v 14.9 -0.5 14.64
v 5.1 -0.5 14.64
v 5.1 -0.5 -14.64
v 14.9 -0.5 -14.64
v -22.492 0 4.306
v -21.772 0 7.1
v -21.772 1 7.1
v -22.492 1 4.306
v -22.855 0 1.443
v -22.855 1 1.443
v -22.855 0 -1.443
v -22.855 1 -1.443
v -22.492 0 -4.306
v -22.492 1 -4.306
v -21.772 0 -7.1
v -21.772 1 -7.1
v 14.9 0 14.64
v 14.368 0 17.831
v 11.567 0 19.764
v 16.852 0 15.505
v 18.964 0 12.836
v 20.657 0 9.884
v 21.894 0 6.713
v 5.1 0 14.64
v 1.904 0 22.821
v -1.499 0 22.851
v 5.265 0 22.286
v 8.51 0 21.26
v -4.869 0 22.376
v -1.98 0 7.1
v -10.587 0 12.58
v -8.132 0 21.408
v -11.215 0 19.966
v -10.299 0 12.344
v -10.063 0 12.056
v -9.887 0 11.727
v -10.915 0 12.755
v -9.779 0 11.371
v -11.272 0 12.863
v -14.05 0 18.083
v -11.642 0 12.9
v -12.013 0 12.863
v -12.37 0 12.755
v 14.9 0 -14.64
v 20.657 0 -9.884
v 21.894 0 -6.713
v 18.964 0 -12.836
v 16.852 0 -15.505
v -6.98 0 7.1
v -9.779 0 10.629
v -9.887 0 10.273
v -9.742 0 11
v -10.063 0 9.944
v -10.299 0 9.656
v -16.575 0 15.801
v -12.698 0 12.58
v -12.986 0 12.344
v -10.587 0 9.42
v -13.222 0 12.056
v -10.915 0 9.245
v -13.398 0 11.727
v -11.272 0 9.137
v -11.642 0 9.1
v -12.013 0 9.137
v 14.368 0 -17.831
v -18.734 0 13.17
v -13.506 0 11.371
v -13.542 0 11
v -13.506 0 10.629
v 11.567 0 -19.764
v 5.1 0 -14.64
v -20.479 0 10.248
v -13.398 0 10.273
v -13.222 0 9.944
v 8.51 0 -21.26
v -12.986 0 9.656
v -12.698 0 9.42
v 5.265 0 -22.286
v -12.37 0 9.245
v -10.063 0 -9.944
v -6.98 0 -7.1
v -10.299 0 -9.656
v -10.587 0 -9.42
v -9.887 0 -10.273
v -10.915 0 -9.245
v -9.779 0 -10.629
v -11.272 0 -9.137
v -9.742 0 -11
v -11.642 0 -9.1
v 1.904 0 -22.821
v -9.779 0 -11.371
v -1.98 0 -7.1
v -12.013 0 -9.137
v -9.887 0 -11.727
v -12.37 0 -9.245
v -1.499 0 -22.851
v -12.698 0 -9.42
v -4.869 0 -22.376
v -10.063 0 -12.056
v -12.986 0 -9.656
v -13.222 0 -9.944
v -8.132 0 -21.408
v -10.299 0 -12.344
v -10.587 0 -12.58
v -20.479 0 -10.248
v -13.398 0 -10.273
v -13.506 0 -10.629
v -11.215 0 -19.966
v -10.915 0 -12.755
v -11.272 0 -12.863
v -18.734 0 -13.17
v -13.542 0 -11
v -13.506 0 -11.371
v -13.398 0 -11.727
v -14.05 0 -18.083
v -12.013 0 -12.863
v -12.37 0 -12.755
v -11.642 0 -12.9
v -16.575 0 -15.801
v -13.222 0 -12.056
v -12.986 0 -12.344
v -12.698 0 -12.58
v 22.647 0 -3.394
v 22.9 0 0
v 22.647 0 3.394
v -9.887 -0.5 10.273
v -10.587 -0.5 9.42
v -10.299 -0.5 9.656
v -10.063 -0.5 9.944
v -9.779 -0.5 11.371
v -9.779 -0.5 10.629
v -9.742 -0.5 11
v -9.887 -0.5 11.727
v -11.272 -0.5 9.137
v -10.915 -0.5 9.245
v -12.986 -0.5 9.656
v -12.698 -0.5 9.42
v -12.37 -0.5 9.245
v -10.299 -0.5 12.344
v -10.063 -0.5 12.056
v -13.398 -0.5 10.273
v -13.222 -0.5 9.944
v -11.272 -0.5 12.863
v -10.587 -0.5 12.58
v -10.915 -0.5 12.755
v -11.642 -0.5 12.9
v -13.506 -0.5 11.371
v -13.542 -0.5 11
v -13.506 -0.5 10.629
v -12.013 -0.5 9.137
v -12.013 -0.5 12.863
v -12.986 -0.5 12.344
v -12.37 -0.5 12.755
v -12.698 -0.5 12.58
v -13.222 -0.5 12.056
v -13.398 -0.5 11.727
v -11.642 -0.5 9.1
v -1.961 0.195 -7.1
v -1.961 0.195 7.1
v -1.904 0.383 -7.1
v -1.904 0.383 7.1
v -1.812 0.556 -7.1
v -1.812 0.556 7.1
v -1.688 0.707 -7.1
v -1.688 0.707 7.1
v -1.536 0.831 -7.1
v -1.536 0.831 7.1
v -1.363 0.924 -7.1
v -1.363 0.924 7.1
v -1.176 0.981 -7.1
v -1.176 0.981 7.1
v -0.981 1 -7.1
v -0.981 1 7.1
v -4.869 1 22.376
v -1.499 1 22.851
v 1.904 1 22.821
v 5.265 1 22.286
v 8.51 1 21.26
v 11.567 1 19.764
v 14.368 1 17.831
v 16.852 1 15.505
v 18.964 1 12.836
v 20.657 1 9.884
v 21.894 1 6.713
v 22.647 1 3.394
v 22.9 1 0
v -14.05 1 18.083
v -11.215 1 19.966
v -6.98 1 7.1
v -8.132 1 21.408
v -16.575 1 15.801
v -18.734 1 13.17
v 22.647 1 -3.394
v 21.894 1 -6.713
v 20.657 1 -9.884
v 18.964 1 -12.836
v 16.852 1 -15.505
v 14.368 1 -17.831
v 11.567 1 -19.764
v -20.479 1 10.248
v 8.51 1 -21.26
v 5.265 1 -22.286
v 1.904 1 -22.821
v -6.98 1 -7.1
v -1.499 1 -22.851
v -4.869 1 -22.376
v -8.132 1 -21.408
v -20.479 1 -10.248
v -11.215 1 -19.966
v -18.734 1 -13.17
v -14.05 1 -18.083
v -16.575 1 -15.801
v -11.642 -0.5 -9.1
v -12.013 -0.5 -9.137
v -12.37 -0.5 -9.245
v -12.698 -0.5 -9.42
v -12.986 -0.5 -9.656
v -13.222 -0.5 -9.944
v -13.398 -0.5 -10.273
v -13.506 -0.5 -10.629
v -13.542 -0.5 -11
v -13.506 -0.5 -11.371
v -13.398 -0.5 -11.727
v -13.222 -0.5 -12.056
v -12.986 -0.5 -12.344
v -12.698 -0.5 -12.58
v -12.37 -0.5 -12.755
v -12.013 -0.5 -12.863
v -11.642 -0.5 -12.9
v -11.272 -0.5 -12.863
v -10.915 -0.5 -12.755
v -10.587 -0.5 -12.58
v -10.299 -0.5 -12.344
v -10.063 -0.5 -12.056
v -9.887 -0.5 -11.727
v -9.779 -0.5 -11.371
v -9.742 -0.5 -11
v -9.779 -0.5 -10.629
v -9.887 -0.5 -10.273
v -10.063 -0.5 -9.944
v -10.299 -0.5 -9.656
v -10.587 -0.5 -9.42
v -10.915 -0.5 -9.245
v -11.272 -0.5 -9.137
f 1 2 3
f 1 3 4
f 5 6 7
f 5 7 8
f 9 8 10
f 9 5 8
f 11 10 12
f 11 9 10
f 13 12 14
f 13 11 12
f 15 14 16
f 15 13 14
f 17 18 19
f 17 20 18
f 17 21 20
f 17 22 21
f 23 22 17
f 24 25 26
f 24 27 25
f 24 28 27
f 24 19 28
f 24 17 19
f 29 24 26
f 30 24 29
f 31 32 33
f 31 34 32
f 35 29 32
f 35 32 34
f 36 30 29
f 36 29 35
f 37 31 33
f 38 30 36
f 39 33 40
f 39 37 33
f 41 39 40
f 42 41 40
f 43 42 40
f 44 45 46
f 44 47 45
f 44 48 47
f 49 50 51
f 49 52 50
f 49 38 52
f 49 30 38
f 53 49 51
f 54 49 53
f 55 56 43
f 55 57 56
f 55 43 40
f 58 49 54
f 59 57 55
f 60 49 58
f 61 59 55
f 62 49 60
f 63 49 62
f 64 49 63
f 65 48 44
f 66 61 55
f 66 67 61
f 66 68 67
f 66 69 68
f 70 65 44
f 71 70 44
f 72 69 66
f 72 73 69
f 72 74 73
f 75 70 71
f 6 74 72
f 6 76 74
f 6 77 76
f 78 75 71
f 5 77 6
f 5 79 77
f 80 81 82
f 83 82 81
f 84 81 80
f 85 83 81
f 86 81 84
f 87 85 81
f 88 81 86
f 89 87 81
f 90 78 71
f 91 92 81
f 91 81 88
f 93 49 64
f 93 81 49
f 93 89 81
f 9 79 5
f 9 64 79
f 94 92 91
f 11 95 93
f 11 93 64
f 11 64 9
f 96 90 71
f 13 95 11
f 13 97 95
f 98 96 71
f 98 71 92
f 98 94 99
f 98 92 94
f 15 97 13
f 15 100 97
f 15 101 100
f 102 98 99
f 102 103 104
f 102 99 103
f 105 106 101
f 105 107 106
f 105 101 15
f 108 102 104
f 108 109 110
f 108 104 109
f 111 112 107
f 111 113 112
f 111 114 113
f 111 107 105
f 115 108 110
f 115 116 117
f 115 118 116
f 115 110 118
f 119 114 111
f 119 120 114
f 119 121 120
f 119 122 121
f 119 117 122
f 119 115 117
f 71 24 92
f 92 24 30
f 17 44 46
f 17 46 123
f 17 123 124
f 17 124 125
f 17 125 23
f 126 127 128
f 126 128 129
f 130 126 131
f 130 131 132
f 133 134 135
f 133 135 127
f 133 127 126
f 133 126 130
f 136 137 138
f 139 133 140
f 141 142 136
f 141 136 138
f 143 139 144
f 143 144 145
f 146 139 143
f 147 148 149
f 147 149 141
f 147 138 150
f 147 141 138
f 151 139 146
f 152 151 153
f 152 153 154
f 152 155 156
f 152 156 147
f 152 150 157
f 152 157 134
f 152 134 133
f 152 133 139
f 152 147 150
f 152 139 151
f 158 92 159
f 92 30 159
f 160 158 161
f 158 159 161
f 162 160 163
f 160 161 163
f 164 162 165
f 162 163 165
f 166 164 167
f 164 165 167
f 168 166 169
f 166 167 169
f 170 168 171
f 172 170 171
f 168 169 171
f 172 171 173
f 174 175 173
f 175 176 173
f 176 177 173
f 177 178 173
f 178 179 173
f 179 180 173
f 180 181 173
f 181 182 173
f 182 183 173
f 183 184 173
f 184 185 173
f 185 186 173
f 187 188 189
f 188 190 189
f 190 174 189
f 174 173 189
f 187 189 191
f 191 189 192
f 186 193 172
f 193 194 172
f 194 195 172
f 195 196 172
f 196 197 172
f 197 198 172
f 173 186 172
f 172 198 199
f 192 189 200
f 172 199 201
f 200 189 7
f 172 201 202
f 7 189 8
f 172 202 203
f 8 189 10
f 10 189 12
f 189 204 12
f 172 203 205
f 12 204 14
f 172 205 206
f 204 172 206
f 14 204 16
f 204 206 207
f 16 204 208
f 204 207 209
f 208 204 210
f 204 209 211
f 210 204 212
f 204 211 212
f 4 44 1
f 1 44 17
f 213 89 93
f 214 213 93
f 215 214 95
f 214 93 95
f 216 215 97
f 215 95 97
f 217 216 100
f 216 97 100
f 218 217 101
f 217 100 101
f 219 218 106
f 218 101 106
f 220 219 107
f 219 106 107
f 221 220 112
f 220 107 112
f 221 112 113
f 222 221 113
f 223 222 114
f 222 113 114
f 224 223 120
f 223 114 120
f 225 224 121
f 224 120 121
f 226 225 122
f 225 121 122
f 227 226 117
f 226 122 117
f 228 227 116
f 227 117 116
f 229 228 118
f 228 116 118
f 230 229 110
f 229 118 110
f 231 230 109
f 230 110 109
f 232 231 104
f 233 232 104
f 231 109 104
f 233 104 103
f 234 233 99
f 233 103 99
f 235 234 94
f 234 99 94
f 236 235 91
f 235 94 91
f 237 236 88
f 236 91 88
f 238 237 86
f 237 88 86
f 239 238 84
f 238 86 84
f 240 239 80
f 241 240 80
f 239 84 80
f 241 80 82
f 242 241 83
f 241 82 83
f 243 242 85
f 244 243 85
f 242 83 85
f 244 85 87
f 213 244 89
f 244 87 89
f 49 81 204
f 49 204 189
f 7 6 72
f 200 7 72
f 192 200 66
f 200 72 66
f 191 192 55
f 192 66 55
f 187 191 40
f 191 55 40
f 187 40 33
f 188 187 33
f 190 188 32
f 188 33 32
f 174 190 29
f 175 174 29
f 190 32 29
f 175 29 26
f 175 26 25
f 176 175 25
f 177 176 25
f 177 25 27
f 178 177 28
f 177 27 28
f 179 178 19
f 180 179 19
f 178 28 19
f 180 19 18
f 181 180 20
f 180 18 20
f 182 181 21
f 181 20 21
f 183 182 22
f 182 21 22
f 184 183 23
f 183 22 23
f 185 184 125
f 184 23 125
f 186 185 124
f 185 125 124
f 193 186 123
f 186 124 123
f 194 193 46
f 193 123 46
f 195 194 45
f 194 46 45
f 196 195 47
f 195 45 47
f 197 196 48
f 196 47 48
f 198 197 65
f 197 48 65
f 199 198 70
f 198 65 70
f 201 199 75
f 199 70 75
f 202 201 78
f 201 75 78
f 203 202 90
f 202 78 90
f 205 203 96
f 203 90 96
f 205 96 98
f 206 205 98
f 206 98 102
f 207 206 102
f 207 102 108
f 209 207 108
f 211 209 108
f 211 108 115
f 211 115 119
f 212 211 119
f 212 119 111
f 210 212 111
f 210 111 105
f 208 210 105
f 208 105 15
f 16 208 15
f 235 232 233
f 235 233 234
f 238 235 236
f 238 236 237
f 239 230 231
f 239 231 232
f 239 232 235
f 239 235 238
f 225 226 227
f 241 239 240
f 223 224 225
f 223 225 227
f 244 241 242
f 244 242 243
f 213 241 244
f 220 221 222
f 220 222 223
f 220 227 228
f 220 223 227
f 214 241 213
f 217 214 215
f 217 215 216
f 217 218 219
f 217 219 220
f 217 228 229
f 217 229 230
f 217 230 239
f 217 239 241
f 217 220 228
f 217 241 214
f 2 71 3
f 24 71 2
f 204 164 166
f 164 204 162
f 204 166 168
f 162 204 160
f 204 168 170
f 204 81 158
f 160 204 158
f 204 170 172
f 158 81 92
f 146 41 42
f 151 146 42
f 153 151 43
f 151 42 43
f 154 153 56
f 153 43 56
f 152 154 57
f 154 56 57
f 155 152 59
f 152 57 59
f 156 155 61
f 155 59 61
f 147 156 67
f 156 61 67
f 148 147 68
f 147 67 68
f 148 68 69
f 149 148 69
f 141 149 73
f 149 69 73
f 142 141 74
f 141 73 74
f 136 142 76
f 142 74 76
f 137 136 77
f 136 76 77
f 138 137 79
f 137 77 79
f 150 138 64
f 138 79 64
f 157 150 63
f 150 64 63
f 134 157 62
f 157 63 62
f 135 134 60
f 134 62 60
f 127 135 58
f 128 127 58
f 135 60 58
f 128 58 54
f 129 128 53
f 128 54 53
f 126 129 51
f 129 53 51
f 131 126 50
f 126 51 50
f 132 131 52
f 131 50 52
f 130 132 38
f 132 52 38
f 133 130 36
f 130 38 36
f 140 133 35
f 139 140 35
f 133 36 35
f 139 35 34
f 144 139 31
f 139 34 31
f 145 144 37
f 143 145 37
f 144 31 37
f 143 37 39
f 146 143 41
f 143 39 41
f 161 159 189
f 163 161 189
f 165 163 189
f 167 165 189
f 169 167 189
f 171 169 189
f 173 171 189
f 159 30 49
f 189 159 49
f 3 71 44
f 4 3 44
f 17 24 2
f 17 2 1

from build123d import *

# Parameters (mm, degrees)
BOSS_EXTRUDE1_DEPTH = 1
SKETCH2_R           = 1.9
SKETCH2_W           = 9.8
SKETCH2_H           = 29.28075205
BOSS_EXTRUDE2_DEPTH = 0.5
FILLET1_R           = 1
BOSS_EXTRUDE3_START = -1
BOSS_EXTRUDE3_DEPTH = 1


with BuildPart() as part:
    # Sketch1 → Boss-Extrude1 (new body)
    with BuildSketch(Plane(origin=(0, 0, 0), x_dir=(1, 0, 0), z_dir=(0, 1, 0))):
        with BuildLine():
            Line((-21.771541057, 7.1), (-1.980475175, 7.1))
            Line((-1.980475175, 7.1), (-1.980475175, -7.1))
            Line((-1.980475175, -7.1), (-21.771541057, -7.1))
            ThreePointArc((-21.771541057, -7.1), (22.9, 0), (-21.771541057, 7.1))
        make_face()
    extrude(amount=BOSS_EXTRUDE1_DEPTH)

    # Sketch2 → Boss-Extrude2 (add)
    with BuildSketch(Plane.XZ):
        with Locations(Location((-11.642490831, 11, 0), (0, 0, 90))):
            Circle(SKETCH2_R)
        with Locations(Location((-11.642490831, -11, 0), (0, 0, 90))):
            Circle(SKETCH2_R)
        with Locations((10, 0)):
            Rectangle(SKETCH2_W, SKETCH2_H)
    extrude(amount=BOSS_EXTRUDE2_DEPTH)

    # Fillet1
    fillet1_edges = [part.edges().sort_by_distance(p)[0] for p in [
        (-1.980475175, 1, 0),
    ]]
    fillet(fillet1_edges, radius=FILLET1_R - 0.0001)  # a hair under: the kernel refuses the full size

    # Sketch3 → Boss-Extrude3 (add)
    with BuildSketch(Plane(origin=(0, 1, 0), x_dir=(1, 0, 0), z_dir=(0, 1, 0)).offset(BOSS_EXTRUDE3_START)):
        with BuildLine():
            Line((-6.980475175, -7.1), (-21.771541057, -7.1))
            ThreePointArc((-21.771541057, -7.1), (-22.9, 0), (-21.771541057, 7.1))
            Line((-21.771541057, 7.1), (-6.980475175, 7.1))
            Line((-6.980475175, 7.1), (-6.980475175, -7.1))
        make_face()
    extrude(amount=BOSS_EXTRUDE3_DEPTH)


solid = part.part
